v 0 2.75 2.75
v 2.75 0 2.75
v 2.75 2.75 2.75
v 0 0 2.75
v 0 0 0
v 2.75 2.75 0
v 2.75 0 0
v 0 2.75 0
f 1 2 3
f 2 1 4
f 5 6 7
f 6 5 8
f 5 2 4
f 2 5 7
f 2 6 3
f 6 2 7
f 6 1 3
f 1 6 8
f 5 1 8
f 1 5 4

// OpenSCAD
// Eval-bound: heavy pure computation (tail-recursive Collatz over a big range),
// tiny geometry output. Stresses the interpreter, not the kernel.
function collatz(n, acc=0) =
    n <= 1 ? acc : collatz(n % 2 == 0 ? n/2 : 3*n + 1, acc + 1);
steps = [for (i = [1:1:15000]) collatz(i)];
m = max(steps);
// a tiny cube whose size depends on the whole computation
cube(m / 100);
